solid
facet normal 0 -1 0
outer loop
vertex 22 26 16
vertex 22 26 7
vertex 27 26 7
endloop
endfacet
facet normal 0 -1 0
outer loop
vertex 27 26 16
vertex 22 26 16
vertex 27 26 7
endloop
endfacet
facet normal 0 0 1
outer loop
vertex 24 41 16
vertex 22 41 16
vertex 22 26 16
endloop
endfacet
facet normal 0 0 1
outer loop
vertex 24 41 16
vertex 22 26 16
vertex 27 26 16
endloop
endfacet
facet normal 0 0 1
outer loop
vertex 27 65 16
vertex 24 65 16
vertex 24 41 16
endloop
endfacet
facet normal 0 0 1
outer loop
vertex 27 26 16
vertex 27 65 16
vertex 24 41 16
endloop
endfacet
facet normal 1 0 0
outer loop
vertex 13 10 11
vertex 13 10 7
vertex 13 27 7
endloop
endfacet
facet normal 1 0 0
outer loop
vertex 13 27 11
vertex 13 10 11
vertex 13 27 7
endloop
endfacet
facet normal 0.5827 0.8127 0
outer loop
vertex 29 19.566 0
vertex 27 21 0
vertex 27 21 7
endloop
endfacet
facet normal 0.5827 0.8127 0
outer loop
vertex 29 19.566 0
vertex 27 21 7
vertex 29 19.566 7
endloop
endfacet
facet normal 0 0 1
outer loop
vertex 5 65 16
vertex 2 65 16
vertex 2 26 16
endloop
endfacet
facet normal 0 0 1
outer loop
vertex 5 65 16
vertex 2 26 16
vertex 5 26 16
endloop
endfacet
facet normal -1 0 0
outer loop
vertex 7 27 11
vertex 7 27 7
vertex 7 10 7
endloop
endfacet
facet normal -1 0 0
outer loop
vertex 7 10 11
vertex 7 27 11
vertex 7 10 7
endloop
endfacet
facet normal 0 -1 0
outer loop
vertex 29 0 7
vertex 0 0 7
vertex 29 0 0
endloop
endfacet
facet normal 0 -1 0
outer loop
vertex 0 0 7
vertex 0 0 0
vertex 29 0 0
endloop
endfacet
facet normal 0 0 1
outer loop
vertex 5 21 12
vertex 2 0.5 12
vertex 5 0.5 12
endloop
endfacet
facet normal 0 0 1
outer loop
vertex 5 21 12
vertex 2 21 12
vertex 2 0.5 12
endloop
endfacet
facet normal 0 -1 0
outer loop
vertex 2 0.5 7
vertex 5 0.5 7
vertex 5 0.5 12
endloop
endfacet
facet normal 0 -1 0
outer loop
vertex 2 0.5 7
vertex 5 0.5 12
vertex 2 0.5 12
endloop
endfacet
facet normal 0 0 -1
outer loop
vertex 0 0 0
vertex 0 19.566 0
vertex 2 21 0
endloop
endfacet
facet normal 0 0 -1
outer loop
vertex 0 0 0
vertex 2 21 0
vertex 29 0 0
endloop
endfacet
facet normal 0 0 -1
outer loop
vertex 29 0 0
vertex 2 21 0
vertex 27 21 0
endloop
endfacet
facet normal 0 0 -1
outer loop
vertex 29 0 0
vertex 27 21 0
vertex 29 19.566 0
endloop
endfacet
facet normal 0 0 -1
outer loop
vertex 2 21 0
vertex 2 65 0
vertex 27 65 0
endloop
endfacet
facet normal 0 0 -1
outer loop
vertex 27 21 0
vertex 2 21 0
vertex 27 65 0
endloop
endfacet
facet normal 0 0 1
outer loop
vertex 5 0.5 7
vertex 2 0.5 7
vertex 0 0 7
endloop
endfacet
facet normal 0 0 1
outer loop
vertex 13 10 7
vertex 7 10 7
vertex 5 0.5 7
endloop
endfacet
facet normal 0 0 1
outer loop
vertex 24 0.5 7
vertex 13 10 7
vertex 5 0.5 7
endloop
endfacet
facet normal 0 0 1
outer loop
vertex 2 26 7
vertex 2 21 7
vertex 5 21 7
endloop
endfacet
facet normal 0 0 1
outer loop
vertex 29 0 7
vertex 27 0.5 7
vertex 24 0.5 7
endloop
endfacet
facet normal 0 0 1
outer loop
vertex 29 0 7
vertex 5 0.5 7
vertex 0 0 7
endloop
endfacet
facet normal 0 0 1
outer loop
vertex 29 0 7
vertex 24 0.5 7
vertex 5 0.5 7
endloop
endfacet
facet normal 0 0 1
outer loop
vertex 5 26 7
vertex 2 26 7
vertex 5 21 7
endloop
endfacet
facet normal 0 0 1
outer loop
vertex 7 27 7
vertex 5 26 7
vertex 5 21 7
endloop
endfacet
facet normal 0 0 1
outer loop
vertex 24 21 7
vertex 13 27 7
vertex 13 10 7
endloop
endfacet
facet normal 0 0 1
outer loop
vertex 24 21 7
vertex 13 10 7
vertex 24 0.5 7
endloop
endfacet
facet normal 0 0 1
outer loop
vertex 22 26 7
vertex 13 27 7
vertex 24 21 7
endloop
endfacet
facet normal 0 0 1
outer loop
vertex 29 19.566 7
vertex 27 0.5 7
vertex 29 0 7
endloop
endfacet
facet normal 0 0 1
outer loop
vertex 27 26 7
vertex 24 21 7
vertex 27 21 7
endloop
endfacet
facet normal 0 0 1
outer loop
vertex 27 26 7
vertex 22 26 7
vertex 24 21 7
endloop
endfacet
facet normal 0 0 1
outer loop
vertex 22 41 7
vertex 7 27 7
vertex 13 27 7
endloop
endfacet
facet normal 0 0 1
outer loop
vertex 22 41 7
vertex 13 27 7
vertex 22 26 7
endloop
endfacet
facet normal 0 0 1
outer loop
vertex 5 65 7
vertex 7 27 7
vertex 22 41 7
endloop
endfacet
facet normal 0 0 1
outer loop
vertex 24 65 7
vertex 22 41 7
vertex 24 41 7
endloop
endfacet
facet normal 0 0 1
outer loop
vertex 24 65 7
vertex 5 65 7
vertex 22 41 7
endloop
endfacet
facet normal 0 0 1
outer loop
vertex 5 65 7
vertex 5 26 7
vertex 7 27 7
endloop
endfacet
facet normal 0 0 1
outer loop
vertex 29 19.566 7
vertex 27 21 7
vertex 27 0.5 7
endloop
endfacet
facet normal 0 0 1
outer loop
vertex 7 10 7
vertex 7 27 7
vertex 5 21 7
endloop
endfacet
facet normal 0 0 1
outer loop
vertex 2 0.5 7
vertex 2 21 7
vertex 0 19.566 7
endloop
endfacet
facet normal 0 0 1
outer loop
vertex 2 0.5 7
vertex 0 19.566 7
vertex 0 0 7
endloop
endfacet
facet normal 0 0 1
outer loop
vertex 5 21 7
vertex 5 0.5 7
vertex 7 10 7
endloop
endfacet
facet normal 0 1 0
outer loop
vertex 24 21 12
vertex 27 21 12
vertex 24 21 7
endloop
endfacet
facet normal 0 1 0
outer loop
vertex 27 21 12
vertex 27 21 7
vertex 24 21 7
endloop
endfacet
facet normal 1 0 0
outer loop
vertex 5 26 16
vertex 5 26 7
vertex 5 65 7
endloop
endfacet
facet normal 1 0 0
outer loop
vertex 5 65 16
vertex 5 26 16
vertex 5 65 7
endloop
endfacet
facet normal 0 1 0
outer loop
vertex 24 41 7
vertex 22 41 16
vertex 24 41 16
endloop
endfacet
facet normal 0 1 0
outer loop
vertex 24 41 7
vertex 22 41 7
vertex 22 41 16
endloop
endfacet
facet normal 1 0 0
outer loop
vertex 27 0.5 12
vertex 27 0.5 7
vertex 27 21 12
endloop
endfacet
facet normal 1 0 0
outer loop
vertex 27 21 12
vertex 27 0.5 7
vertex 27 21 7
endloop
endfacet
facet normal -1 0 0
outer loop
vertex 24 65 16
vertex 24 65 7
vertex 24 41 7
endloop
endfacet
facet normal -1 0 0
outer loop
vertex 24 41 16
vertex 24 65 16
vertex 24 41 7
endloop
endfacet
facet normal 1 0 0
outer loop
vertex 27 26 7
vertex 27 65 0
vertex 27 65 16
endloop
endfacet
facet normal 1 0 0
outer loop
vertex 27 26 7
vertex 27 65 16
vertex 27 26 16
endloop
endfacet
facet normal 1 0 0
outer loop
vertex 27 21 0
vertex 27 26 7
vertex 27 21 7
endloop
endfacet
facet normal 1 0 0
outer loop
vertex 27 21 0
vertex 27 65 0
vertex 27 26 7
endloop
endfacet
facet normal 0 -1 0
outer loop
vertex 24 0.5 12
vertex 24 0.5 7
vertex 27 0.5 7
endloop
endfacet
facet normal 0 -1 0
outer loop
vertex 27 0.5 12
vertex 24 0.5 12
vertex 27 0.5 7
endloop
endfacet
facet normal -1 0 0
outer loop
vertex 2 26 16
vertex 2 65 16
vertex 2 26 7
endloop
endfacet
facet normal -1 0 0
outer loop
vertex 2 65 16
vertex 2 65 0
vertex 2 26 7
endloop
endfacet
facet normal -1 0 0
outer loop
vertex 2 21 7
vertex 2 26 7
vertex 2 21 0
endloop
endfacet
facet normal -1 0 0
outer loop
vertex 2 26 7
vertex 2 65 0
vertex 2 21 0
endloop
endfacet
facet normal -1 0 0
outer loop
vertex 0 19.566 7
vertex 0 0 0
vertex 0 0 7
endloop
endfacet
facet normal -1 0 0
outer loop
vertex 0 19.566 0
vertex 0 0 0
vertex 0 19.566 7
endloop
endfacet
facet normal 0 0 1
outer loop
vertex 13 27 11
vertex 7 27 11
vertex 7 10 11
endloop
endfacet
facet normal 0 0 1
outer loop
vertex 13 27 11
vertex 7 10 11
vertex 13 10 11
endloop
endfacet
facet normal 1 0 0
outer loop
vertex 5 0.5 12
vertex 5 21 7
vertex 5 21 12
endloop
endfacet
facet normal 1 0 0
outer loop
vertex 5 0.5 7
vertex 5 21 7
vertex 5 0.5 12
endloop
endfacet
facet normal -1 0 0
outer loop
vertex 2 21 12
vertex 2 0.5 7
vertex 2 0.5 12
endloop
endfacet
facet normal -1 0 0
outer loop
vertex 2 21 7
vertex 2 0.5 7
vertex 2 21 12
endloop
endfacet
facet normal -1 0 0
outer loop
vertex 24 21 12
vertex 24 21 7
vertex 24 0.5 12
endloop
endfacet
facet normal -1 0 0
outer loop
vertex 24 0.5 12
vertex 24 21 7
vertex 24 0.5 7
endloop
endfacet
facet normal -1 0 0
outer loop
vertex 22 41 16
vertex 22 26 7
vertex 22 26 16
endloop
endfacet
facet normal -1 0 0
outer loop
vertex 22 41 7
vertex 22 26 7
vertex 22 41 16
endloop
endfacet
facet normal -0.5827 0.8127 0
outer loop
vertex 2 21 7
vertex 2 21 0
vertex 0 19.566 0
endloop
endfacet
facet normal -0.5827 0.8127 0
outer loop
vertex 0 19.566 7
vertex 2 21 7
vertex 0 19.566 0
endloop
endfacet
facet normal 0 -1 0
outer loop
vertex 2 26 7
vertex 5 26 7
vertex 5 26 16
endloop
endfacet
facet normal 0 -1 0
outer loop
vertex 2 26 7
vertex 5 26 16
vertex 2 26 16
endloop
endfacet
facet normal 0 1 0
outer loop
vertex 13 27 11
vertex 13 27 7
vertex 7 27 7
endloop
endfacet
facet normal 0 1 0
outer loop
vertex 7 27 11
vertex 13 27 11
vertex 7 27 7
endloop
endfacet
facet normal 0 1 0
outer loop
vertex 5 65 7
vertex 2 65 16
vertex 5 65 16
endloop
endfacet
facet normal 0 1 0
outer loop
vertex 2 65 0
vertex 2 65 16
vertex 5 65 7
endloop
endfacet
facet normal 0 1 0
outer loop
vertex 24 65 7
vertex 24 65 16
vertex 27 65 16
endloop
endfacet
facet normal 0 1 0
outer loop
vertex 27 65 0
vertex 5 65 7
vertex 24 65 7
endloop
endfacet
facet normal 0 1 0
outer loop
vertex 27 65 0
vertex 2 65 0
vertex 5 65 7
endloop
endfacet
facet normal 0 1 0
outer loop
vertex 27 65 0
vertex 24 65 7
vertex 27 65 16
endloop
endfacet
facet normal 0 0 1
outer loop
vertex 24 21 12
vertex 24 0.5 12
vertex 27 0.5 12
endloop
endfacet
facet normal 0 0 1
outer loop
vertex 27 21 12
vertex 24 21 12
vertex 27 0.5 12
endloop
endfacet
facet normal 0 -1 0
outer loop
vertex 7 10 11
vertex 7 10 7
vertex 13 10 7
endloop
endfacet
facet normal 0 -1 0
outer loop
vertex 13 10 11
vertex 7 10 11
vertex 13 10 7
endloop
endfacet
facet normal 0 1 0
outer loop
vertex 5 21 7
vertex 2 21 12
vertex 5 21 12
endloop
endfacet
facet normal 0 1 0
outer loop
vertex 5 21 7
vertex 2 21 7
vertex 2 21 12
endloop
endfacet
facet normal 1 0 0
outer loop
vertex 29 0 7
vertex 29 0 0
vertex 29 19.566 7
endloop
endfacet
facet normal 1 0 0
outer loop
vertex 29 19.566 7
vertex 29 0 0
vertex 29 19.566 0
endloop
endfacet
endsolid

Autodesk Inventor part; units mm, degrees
ref_plane "YZ Plane" through (0, 0, 0) normal (1, 0, 0) x (0, 1, 0)
ref_plane "XZ Plane" through (0, 0, 0) normal (0, 1, 0) x (-1, 0, 0)
ref_plane "XY Plane" through (0, 0, 0) normal (0, 0, 1) x (1, 0, 0)
sketch "Boceto1" plane through (0, 0, 0) normal (0, 0, 1) x (1, 0, 0)
  line L0 (0, 0) -> (0, 19.566)
  line L1 (2, 65) -> (2, 21)
  line L2 (2, 21) -> (0, 19.566)
  line L3 (2, 65) -> (14.5, 65)
  line L4 (29, 0) -> (29, 19.566)
  line L5 (27, 65) -> (27, 21)
  line L6 (27, 21) -> (29, 19.566)
  line L7 (27, 65) -> (14.5, 65)
  line L8 (0, 0) -> (29, 0)
extrude "Extrusión1" add sketch "Boceto1" along normal blind 7
sketch "Boceto2" plane through (0, 0, 7) normal (0, 0, 1) x (1, 0, 0)
  line L0 (27, 65) -> (27, 21) projected
  line L1 (2, 65) -> (27, 65) projected
  line L2 (2, 21) -> (2, 65) projected
  line L3 (2, 65) -> (5, 65)
  line L4 (2, 65) -> (2, 26)
  line L5 (5, 26) -> (5, 65)
  line L6 (27, 65) -> (24, 65)
  line L7 (24, 65) -> (24, 41)
  line L8 (27, 65) -> (27, 26)
  line L9 (5, 26) -> (2, 26)
  line L10 (24, 26) -> (27, 26)
  line L11 (24.1227, 26) -> (22, 26)
  line L12 (22, 26) -> (22, 41)
  line L13 (22, 41) -> (24, 41)
  dimension "d7" = 15
extrude "Extrusión2" add sketch "Boceto2" along normal blind 9
sketch "Boceto3" plane through (0, 0, 7) normal (0, 0, 1) x (1, 0, 0)
  line L0 (5, 65) -> (24, 65) projected
  line L1 (29, 0) -> (0, 0) projected
  line L2 (22, 41) -> (24, 41) projected
  line L3 (2, 0.5) -> (2, 21)
  line L4 (2, 21) -> (5, 21)
  line L5 (5, 21) -> (5, 0.5)
  line L6 (5, 0.5) -> (2, 0.5)
  line L7 (27, 0.5) -> (27, 21)
  line L8 (27, 21) -> (24, 21)
  line L9 (24, 21) -> (24, 0.5)
  line L10 (24, 0.5) -> (27, 0.5)
  dimension "d9" = 20.5
extrude "Extrusión3" add sketch "Boceto3" along normal blind 5
sketch "Boceto4" plane through (0, 0, 7) normal (0, 0, 1) x (1, 0, 0)
  line L0 (29, 0) -> (0, 0) projected
  line L1 (7, 10) -> (13, 10)
  line L2 (13, 10) -> (13, 27)
  line L3 (13, 27) -> (7, 27)
  line L4 (7, 27) -> (7, 10)
extrude "Extrusión4" add sketch "Boceto4" along normal blind 4
properties part number "fio"
